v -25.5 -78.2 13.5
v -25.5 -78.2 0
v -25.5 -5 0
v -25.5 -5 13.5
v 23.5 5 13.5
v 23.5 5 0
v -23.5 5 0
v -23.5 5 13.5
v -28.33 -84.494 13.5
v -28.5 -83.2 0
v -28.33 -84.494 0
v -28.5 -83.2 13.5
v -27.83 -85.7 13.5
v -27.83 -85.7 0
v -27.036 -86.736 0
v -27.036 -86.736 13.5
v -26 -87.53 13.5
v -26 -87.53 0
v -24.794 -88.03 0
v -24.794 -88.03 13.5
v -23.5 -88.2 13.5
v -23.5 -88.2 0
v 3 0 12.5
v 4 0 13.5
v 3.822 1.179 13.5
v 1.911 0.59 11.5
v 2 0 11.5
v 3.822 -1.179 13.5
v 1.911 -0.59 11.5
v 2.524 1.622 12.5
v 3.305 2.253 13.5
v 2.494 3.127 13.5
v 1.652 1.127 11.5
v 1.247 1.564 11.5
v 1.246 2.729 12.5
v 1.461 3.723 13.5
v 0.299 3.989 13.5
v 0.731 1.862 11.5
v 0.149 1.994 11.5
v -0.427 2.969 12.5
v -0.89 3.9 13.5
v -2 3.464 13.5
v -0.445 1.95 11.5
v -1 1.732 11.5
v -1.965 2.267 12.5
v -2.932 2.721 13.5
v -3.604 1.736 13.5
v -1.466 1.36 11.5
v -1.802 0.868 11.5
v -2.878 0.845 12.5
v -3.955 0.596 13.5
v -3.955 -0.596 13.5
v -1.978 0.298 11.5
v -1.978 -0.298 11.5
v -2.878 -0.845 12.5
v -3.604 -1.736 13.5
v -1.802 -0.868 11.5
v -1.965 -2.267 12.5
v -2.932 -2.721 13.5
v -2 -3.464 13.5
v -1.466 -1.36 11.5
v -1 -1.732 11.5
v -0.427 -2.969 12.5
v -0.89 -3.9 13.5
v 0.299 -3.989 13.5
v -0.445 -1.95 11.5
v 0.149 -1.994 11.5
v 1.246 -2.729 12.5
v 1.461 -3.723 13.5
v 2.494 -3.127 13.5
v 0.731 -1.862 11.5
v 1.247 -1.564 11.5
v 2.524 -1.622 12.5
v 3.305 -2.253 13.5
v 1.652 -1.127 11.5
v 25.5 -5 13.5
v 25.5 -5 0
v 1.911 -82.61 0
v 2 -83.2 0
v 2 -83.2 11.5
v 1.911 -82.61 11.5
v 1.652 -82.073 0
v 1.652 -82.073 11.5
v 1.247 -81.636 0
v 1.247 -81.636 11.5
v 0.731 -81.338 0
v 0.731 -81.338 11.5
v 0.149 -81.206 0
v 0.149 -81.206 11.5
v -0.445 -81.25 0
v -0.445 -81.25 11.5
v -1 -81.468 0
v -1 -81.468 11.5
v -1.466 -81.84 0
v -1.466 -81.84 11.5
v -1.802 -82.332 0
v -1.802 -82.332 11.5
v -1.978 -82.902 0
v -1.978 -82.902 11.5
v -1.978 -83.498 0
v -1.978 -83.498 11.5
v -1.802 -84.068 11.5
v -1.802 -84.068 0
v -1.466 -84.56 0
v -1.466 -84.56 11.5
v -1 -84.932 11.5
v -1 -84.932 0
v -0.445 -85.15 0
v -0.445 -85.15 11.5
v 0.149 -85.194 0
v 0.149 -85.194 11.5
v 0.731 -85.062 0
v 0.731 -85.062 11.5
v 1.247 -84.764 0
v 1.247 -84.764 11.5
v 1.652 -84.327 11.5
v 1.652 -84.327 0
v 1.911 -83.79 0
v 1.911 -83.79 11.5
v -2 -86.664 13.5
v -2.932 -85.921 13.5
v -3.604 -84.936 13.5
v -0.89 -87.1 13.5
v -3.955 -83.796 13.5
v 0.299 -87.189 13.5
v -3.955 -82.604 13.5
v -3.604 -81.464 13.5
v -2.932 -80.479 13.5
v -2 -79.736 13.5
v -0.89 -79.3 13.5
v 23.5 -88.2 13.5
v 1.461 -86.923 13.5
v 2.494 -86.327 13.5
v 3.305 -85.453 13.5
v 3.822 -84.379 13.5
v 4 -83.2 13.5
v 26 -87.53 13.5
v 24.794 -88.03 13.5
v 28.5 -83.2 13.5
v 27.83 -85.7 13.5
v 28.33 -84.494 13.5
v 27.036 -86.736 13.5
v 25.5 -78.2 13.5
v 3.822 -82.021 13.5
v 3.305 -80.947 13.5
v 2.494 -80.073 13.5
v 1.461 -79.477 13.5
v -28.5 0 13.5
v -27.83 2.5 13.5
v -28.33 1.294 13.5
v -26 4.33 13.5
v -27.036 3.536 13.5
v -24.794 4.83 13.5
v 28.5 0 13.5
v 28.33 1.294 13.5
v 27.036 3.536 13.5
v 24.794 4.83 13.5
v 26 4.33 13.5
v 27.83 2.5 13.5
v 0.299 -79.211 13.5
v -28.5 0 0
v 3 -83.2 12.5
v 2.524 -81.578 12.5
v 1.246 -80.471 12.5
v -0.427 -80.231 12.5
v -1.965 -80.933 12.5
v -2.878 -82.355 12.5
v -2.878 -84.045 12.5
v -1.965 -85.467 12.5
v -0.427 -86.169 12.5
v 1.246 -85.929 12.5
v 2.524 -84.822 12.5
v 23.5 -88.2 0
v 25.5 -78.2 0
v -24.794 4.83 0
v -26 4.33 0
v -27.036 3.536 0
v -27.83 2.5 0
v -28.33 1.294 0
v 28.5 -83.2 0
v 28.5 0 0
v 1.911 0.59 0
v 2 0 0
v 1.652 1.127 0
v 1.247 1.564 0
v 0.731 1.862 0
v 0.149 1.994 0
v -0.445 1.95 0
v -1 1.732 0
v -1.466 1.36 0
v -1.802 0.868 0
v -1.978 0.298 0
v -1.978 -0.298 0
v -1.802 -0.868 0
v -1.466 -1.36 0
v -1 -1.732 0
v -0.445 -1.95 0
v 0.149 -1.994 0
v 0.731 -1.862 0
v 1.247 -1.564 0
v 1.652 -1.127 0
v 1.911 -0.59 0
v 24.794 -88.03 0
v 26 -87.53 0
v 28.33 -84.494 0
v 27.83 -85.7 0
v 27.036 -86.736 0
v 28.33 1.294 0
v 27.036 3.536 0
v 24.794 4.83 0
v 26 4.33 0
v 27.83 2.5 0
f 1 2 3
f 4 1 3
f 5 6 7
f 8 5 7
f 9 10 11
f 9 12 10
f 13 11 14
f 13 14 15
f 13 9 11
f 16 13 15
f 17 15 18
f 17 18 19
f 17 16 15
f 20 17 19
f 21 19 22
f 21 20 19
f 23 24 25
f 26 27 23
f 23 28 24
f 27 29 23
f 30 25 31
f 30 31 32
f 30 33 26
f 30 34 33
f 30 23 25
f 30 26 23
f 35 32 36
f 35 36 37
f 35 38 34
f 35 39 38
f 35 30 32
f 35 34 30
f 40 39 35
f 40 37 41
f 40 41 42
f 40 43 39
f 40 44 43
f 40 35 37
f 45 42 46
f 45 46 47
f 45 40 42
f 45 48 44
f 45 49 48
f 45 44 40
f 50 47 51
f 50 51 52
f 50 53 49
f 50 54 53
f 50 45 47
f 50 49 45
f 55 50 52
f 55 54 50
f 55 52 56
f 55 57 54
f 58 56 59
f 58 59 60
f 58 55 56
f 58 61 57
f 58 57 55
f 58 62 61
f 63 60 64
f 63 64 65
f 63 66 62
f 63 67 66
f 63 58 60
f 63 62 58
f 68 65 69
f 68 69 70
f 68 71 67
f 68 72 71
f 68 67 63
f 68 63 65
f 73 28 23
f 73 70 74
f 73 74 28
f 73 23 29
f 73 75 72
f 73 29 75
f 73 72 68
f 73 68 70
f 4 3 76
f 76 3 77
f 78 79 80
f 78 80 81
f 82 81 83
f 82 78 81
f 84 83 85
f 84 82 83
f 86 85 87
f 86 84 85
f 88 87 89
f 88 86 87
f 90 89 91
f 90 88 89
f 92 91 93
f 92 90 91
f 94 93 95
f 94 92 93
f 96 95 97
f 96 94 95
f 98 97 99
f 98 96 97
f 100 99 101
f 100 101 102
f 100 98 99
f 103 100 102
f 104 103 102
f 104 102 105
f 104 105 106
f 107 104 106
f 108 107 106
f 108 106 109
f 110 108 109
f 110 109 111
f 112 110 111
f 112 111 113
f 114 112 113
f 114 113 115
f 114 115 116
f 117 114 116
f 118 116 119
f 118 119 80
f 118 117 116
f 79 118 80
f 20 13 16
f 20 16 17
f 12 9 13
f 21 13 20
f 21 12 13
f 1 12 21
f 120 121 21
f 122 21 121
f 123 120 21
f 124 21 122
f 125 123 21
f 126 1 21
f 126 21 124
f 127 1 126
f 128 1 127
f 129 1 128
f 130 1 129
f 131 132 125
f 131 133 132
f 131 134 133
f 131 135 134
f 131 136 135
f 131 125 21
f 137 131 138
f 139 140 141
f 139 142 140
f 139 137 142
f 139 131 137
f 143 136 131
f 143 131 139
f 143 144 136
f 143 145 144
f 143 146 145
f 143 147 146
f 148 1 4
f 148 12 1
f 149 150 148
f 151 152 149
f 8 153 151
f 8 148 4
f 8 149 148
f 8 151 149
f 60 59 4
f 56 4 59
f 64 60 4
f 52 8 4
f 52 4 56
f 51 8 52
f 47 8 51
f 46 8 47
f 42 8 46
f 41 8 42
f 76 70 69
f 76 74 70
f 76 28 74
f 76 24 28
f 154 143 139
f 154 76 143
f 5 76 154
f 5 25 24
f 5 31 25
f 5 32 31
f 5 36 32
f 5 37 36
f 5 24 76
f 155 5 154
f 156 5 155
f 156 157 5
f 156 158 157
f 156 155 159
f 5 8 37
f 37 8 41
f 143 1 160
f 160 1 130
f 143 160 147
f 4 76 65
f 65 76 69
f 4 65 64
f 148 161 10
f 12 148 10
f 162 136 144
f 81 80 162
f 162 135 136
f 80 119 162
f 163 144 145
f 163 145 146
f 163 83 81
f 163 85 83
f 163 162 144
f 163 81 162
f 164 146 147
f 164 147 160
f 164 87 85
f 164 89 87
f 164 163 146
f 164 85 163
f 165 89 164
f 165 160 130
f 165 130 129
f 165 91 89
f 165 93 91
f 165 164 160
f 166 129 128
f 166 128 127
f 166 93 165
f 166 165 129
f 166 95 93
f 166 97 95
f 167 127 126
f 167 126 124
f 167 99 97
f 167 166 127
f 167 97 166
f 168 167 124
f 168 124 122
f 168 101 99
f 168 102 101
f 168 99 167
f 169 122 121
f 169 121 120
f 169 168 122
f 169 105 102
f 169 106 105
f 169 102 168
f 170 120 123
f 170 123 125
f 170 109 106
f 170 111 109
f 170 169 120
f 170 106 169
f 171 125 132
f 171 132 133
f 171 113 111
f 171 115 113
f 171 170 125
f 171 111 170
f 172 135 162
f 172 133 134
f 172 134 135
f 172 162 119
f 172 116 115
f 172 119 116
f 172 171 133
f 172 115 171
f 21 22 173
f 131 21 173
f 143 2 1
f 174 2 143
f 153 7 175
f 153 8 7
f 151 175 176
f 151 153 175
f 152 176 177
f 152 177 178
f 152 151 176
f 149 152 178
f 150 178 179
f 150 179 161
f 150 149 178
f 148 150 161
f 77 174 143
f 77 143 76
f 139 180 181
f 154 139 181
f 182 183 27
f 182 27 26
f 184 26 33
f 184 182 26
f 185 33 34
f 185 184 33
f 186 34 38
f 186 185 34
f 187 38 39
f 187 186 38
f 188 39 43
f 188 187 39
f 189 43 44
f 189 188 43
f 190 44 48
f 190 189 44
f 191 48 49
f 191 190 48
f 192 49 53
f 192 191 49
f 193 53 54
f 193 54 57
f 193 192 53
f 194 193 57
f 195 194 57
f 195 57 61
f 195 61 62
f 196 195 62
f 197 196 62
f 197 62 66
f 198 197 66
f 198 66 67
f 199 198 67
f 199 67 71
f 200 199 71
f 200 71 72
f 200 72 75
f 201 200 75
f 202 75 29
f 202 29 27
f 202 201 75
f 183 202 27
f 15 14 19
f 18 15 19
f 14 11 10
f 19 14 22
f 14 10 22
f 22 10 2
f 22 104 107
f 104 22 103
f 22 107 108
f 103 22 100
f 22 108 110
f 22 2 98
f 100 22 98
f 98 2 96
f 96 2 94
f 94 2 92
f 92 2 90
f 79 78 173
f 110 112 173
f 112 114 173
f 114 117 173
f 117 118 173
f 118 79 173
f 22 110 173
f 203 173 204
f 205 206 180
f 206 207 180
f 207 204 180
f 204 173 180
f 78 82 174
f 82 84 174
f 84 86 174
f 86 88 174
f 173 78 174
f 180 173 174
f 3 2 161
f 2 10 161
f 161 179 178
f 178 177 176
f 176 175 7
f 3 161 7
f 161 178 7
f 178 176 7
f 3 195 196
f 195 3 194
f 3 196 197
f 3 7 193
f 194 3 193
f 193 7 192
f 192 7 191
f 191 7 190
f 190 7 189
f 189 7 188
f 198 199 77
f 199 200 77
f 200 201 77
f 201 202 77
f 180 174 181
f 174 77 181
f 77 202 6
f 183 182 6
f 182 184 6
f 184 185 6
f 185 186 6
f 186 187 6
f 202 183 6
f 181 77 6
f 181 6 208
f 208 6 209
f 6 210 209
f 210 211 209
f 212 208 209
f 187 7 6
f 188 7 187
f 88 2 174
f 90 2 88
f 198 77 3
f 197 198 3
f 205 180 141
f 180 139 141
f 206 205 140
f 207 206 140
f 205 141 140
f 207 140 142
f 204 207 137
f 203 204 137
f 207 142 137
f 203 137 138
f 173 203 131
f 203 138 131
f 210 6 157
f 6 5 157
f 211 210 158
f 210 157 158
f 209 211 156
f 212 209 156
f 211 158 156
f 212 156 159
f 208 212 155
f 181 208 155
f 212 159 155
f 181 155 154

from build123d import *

# Parameters (mm, degrees)
F0_R     = 2
F0_W     = 51
F0_H     = 73.2
F1_DEPTH = 13.5
F2_R     = 5
F3_SIZE  = 2


with BuildPart() as f1:
    # F0 (on Top) → F1 (new body)
    with BuildSketch(Plane.XY):
        Polygon((28.5, -5), (28.5, 5), (-28.5, 5), (-28.5, -5), (-28.5, -78.2), (-28.5, -88.2), (28.5, -88.2), (28.5, -78.2), align=None)
        with Locations((0, -83.2)):
            Circle(F0_R, mode=Mode.SUBTRACT)
        with Locations((0, -41.6)):
            Rectangle(F0_W, F0_H, mode=Mode.SUBTRACT)
        Circle(F0_R, mode=Mode.SUBTRACT)
    extrude(amount=F1_DEPTH)

    # F2
    f2_edges = [f1.edges().sort_by_distance(p)[0] for p in [
        (-28.5, 5, 6.75),
        (28.5, 5, 6.75),
        (-28.5, -88.2, 6.75),
        (28.5, -88.2, 6.75),
    ]]
    fillet(f2_edges, radius=F2_R)

    # F3
    f3_edges = [f1.edges().sort_by_distance(p)[0] for p in [
        (-2, 0, 13.5),
        (-2, -83.2, 13.5),
    ]]
    chamfer(f3_edges, length=F3_SIZE)


solid = f1.part
